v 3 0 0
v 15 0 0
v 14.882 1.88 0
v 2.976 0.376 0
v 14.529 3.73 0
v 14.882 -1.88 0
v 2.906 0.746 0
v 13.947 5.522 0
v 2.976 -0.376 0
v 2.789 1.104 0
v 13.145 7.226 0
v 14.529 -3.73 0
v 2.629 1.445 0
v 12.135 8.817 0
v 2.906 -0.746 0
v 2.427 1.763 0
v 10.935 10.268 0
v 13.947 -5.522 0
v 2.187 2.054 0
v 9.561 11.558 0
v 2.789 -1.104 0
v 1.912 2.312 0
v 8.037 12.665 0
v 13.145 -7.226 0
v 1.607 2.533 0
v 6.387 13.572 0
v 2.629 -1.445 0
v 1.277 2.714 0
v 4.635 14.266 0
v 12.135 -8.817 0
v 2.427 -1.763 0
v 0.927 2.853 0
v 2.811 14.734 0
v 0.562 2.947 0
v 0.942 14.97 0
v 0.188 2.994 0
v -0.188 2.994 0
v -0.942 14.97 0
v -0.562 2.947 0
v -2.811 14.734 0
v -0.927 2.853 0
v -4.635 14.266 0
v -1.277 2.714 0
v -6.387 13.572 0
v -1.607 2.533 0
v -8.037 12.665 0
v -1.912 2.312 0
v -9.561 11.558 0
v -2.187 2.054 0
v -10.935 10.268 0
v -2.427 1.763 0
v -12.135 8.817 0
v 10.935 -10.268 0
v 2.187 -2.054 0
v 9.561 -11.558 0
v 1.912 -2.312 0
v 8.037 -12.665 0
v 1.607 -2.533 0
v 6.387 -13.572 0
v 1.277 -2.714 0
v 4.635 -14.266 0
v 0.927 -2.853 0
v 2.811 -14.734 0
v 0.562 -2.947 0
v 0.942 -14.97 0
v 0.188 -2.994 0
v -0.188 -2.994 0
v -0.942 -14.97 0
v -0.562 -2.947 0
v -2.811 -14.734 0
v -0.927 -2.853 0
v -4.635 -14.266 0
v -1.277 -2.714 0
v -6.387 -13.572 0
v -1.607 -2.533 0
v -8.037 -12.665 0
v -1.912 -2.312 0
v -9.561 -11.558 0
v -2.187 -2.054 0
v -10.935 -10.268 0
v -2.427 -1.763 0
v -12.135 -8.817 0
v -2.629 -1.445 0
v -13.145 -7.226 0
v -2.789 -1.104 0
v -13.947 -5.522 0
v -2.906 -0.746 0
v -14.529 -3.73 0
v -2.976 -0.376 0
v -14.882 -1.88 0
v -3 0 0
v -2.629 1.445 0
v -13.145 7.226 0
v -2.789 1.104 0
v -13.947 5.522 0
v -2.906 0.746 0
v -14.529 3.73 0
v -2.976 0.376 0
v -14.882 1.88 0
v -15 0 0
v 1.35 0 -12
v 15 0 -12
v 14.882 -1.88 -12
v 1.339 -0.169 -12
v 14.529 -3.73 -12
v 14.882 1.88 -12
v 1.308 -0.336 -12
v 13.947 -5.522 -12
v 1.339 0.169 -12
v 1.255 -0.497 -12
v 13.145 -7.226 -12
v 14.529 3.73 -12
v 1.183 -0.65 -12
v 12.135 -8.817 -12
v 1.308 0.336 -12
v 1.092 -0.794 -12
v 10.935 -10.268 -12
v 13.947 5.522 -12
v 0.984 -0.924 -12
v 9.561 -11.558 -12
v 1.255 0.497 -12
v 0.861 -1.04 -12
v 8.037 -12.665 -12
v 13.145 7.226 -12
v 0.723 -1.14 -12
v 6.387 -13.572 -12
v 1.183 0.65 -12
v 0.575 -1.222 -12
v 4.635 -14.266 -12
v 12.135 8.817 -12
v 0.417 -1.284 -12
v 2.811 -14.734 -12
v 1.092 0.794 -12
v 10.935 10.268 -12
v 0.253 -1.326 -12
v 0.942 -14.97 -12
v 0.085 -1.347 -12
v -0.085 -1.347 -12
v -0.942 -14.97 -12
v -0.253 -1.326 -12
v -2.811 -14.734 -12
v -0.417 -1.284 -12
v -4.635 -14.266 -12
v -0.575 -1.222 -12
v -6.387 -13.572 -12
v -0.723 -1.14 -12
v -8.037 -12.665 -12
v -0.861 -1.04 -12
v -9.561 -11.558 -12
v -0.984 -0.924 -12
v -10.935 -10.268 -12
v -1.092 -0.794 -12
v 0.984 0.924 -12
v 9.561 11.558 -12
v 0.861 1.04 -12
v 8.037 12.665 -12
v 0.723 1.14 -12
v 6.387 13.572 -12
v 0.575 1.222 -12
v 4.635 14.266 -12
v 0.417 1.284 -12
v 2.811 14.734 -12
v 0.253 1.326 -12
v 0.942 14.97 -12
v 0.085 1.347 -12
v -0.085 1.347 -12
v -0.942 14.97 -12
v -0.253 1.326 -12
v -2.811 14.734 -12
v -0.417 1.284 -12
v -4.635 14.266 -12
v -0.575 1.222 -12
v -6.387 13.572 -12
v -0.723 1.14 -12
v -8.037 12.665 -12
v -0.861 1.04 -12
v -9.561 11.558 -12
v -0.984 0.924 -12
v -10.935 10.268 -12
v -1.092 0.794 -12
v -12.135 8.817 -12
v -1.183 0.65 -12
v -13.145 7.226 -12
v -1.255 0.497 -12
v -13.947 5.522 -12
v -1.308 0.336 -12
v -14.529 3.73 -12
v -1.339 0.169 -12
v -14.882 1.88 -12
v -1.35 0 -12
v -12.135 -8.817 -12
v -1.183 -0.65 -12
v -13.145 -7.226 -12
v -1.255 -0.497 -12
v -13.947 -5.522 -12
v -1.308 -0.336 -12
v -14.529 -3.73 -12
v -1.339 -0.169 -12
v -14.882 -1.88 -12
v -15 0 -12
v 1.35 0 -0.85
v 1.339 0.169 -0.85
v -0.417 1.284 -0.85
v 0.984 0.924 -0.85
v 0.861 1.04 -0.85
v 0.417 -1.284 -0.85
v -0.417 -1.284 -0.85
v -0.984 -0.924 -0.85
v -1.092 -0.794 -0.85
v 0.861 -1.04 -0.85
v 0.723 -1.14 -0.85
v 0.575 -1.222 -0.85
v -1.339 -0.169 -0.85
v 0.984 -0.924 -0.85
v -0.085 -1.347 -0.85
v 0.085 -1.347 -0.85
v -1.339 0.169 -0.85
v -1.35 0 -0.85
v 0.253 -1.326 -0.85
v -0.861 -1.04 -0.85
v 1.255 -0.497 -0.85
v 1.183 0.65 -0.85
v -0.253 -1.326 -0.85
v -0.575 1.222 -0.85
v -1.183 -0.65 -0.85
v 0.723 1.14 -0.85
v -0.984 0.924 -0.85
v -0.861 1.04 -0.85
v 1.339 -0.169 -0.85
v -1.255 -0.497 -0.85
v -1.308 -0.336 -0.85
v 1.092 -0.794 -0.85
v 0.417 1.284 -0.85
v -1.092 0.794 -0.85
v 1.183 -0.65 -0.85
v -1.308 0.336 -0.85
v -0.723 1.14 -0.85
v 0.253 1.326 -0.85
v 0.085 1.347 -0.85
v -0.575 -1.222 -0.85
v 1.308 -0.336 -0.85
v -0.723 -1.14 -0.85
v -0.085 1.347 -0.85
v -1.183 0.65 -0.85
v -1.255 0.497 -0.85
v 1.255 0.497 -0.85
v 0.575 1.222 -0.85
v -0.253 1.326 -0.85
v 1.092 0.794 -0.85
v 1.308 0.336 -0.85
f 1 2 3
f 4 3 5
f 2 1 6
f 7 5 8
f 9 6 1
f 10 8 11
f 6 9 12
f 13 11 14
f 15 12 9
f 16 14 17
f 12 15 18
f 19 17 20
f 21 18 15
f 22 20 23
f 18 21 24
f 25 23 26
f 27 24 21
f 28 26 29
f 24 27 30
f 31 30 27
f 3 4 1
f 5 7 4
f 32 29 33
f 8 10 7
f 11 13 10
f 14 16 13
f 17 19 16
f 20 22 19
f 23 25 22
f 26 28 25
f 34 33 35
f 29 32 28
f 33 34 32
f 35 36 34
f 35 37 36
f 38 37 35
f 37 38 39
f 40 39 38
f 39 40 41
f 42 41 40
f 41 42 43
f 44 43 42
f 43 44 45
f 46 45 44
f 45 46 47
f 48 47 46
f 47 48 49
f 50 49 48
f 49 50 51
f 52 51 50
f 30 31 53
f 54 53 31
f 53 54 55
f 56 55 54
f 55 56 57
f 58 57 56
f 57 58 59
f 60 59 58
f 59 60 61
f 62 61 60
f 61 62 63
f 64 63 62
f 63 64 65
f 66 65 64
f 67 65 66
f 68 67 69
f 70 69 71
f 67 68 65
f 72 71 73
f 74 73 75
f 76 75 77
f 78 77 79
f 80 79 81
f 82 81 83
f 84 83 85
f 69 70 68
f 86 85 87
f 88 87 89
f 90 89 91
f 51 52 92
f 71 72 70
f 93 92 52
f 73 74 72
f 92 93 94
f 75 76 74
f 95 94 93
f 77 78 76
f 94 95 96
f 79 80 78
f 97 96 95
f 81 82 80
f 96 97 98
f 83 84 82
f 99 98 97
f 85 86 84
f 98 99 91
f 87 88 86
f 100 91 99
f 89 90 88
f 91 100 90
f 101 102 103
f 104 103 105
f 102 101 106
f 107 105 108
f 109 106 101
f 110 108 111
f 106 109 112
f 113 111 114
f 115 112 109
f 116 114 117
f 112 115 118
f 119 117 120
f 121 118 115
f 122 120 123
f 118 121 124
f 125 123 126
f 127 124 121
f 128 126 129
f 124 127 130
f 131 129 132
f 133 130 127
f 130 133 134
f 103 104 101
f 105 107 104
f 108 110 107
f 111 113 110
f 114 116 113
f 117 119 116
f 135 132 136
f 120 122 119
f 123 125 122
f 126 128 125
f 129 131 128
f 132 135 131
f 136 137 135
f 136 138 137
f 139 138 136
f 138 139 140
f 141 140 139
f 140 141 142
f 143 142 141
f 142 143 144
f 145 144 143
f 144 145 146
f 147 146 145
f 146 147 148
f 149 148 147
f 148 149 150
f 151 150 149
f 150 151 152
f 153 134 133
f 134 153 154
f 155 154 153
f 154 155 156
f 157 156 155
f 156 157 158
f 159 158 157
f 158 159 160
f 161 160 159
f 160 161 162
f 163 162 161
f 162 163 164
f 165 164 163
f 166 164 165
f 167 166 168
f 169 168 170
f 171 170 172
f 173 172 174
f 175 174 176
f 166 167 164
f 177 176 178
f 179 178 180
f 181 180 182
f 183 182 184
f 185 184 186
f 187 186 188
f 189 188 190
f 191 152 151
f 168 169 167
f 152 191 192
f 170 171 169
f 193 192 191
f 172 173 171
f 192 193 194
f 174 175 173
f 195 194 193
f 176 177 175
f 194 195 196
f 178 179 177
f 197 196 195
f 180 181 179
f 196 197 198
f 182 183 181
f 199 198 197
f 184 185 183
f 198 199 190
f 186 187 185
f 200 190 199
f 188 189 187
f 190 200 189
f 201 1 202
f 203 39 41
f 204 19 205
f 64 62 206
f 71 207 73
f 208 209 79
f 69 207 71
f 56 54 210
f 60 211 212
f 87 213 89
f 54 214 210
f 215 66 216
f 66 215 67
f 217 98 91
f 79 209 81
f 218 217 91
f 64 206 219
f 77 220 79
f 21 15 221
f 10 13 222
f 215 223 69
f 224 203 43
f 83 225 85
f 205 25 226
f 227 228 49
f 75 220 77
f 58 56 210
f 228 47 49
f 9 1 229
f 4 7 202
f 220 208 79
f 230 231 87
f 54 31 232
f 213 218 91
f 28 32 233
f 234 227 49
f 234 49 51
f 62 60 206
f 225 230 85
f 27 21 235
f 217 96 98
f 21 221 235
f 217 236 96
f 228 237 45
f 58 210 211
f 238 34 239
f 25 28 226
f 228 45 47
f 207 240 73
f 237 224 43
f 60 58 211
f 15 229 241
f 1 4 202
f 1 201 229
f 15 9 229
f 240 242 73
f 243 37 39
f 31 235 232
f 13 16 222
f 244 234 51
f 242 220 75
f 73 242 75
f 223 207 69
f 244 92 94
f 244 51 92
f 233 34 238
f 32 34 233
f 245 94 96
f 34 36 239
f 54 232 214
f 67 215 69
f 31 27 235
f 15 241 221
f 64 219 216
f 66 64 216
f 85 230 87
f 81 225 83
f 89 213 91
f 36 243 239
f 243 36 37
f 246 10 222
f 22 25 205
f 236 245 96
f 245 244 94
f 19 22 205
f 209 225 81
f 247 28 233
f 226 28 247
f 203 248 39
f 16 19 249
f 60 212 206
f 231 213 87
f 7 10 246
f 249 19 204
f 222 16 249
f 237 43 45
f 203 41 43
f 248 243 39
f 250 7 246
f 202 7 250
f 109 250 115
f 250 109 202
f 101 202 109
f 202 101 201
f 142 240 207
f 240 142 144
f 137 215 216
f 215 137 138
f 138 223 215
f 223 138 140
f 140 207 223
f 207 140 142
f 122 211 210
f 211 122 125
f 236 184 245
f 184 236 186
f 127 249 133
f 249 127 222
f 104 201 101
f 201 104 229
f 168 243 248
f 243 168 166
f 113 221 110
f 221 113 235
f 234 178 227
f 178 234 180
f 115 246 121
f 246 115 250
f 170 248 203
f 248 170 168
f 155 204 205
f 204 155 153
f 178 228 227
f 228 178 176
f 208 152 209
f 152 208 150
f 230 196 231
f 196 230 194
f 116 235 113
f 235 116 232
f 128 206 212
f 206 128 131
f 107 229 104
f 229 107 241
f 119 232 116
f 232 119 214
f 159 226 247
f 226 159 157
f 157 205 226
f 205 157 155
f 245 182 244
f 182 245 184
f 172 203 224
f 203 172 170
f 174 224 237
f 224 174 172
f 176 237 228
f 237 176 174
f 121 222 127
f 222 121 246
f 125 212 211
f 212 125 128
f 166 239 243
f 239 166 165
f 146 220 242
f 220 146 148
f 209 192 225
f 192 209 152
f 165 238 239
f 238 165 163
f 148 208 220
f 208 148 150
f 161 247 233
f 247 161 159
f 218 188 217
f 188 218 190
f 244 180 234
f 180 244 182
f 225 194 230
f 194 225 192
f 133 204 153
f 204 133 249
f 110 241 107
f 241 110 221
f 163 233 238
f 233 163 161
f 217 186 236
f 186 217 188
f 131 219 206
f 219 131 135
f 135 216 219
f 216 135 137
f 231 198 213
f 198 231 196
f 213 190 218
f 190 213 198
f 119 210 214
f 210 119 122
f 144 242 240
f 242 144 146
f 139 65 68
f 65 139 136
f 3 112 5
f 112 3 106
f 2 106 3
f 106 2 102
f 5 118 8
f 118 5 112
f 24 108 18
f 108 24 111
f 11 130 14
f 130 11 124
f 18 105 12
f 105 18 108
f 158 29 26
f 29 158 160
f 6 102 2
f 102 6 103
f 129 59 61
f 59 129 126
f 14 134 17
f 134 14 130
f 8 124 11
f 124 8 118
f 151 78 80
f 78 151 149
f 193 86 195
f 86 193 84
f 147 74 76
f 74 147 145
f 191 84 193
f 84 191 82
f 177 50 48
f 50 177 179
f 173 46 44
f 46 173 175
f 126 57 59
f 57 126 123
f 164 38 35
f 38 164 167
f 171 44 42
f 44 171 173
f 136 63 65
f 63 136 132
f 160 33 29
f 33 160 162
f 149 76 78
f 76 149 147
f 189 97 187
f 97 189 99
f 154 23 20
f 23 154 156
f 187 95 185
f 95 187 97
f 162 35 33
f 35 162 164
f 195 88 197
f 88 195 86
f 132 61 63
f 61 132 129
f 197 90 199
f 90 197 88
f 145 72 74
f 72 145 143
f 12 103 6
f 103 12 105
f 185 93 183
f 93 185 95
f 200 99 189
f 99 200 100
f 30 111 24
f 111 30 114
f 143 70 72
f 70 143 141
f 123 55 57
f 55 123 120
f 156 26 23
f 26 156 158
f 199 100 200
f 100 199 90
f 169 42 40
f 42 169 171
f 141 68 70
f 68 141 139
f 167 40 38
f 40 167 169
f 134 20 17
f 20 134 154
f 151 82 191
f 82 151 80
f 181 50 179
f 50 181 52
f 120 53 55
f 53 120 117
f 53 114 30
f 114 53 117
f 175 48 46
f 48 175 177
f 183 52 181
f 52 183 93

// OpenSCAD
$fn = 50;


difference() {
	union() {
		translate(v = [0, 0, -12.0000000000]) {
			cylinder(h = 12, r = 15.0000000000);
		}
	}
	union() {
		translate(v = [0, 0, 0]) {
			rotate(a = [0, 0, 0]) {
				difference() {
					union() {
						translate(v = [0, 0, -12.0000000000]) {
							cylinder(h = 12, r = 1.0000000000);
						}
						translate(v = [0, 0, -0.8500000000]) {
							cylinder(h = 0.8500000000, r1 = 1.3500000000, r2 = 3.0000000000);
						}
						translate(v = [0, 0, -12.0000000000]) {
							cylinder(h = 12, r = 1.3500000000);
						}
						translate(v = [0, 0, -12.0000000000]) {
							cylinder(h = 12, r = 1.0000000000);
						}
					}
					union();
				}
			}
		}
	}
}
